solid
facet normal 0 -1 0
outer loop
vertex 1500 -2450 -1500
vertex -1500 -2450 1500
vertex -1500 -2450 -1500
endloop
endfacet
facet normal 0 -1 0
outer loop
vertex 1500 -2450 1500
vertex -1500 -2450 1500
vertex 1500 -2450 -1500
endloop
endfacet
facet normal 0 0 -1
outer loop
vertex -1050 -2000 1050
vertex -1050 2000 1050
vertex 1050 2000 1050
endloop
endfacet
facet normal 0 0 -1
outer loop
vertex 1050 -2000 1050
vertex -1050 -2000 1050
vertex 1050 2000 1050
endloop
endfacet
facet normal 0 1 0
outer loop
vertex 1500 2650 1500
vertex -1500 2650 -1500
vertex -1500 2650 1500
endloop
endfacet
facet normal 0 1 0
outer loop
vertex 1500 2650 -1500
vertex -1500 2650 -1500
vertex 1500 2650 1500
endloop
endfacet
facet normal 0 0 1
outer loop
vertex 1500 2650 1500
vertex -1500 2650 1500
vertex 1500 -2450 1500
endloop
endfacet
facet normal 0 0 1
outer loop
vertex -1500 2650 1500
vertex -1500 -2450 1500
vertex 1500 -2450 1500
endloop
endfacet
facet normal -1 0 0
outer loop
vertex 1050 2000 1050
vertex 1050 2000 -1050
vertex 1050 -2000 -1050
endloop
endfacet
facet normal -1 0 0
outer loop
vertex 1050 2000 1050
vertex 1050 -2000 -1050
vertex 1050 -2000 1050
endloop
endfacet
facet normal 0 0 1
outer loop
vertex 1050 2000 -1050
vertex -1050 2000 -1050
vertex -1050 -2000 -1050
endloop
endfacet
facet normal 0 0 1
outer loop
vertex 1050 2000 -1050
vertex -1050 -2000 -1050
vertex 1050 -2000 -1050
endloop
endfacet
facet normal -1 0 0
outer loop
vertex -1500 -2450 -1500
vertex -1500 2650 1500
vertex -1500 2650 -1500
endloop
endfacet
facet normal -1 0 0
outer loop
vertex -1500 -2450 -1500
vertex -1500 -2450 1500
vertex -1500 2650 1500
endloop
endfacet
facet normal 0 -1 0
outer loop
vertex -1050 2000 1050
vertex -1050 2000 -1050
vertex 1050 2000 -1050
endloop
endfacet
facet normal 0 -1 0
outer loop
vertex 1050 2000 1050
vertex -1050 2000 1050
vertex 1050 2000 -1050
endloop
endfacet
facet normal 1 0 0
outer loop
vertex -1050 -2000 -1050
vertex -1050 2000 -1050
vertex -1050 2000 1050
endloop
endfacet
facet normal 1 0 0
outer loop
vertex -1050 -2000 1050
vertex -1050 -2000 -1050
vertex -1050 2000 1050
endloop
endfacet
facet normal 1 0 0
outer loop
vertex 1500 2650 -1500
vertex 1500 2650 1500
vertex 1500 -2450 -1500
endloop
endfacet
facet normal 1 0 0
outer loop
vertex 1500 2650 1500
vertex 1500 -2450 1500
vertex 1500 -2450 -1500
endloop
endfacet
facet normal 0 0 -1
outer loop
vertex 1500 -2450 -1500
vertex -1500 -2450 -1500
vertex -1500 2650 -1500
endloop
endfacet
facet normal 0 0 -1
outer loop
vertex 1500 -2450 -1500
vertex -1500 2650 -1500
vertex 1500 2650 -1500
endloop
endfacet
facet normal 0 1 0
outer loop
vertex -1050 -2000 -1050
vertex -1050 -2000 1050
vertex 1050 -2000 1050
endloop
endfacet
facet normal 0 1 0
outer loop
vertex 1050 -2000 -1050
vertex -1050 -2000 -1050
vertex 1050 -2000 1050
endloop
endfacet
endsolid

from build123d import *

# Parameters (mm, degrees)
SKETCH002_W   = 3000
SKETCH002_H   = 3000
SKETCH002_W_2 = 2100
SKETCH002_H_2 = 2100
PAD_DEPTH     = 2000
SKETCH003_W   = 3000
SKETCH003_H   = 3000
PAD001_DEPTH  = 450
SKETCH004_W   = 3000
SKETCH004_H   = 3000
PAD002_DEPTH  = 650


with BuildPart() as part:
    # Sketch002 → Pad (new body, symmetric)
    with BuildSketch(Plane.XZ):
        Rectangle(SKETCH002_W, SKETCH002_H)
        Rectangle(SKETCH002_W_2, SKETCH002_H_2, mode=Mode.SUBTRACT)
    extrude(amount=PAD_DEPTH, both=True)

    # Sketch003 (on Face10 of Pad) → Pad001 (join)
    with BuildSketch(Plane.XZ.offset(2000)):
        Rectangle(SKETCH003_W, SKETCH003_H)
    extrude(amount=PAD001_DEPTH)

    # Sketch004 (on Face1 of Pad001) → Pad002 (join)
    with BuildSketch(Plane(origin=(0, 2000, 0), x_dir=(1, 0, 0), z_dir=(0, 1, 0))):
        Rectangle(SKETCH004_W, SKETCH004_H)
    extrude(amount=PAD002_DEPTH)


solid = part.part
